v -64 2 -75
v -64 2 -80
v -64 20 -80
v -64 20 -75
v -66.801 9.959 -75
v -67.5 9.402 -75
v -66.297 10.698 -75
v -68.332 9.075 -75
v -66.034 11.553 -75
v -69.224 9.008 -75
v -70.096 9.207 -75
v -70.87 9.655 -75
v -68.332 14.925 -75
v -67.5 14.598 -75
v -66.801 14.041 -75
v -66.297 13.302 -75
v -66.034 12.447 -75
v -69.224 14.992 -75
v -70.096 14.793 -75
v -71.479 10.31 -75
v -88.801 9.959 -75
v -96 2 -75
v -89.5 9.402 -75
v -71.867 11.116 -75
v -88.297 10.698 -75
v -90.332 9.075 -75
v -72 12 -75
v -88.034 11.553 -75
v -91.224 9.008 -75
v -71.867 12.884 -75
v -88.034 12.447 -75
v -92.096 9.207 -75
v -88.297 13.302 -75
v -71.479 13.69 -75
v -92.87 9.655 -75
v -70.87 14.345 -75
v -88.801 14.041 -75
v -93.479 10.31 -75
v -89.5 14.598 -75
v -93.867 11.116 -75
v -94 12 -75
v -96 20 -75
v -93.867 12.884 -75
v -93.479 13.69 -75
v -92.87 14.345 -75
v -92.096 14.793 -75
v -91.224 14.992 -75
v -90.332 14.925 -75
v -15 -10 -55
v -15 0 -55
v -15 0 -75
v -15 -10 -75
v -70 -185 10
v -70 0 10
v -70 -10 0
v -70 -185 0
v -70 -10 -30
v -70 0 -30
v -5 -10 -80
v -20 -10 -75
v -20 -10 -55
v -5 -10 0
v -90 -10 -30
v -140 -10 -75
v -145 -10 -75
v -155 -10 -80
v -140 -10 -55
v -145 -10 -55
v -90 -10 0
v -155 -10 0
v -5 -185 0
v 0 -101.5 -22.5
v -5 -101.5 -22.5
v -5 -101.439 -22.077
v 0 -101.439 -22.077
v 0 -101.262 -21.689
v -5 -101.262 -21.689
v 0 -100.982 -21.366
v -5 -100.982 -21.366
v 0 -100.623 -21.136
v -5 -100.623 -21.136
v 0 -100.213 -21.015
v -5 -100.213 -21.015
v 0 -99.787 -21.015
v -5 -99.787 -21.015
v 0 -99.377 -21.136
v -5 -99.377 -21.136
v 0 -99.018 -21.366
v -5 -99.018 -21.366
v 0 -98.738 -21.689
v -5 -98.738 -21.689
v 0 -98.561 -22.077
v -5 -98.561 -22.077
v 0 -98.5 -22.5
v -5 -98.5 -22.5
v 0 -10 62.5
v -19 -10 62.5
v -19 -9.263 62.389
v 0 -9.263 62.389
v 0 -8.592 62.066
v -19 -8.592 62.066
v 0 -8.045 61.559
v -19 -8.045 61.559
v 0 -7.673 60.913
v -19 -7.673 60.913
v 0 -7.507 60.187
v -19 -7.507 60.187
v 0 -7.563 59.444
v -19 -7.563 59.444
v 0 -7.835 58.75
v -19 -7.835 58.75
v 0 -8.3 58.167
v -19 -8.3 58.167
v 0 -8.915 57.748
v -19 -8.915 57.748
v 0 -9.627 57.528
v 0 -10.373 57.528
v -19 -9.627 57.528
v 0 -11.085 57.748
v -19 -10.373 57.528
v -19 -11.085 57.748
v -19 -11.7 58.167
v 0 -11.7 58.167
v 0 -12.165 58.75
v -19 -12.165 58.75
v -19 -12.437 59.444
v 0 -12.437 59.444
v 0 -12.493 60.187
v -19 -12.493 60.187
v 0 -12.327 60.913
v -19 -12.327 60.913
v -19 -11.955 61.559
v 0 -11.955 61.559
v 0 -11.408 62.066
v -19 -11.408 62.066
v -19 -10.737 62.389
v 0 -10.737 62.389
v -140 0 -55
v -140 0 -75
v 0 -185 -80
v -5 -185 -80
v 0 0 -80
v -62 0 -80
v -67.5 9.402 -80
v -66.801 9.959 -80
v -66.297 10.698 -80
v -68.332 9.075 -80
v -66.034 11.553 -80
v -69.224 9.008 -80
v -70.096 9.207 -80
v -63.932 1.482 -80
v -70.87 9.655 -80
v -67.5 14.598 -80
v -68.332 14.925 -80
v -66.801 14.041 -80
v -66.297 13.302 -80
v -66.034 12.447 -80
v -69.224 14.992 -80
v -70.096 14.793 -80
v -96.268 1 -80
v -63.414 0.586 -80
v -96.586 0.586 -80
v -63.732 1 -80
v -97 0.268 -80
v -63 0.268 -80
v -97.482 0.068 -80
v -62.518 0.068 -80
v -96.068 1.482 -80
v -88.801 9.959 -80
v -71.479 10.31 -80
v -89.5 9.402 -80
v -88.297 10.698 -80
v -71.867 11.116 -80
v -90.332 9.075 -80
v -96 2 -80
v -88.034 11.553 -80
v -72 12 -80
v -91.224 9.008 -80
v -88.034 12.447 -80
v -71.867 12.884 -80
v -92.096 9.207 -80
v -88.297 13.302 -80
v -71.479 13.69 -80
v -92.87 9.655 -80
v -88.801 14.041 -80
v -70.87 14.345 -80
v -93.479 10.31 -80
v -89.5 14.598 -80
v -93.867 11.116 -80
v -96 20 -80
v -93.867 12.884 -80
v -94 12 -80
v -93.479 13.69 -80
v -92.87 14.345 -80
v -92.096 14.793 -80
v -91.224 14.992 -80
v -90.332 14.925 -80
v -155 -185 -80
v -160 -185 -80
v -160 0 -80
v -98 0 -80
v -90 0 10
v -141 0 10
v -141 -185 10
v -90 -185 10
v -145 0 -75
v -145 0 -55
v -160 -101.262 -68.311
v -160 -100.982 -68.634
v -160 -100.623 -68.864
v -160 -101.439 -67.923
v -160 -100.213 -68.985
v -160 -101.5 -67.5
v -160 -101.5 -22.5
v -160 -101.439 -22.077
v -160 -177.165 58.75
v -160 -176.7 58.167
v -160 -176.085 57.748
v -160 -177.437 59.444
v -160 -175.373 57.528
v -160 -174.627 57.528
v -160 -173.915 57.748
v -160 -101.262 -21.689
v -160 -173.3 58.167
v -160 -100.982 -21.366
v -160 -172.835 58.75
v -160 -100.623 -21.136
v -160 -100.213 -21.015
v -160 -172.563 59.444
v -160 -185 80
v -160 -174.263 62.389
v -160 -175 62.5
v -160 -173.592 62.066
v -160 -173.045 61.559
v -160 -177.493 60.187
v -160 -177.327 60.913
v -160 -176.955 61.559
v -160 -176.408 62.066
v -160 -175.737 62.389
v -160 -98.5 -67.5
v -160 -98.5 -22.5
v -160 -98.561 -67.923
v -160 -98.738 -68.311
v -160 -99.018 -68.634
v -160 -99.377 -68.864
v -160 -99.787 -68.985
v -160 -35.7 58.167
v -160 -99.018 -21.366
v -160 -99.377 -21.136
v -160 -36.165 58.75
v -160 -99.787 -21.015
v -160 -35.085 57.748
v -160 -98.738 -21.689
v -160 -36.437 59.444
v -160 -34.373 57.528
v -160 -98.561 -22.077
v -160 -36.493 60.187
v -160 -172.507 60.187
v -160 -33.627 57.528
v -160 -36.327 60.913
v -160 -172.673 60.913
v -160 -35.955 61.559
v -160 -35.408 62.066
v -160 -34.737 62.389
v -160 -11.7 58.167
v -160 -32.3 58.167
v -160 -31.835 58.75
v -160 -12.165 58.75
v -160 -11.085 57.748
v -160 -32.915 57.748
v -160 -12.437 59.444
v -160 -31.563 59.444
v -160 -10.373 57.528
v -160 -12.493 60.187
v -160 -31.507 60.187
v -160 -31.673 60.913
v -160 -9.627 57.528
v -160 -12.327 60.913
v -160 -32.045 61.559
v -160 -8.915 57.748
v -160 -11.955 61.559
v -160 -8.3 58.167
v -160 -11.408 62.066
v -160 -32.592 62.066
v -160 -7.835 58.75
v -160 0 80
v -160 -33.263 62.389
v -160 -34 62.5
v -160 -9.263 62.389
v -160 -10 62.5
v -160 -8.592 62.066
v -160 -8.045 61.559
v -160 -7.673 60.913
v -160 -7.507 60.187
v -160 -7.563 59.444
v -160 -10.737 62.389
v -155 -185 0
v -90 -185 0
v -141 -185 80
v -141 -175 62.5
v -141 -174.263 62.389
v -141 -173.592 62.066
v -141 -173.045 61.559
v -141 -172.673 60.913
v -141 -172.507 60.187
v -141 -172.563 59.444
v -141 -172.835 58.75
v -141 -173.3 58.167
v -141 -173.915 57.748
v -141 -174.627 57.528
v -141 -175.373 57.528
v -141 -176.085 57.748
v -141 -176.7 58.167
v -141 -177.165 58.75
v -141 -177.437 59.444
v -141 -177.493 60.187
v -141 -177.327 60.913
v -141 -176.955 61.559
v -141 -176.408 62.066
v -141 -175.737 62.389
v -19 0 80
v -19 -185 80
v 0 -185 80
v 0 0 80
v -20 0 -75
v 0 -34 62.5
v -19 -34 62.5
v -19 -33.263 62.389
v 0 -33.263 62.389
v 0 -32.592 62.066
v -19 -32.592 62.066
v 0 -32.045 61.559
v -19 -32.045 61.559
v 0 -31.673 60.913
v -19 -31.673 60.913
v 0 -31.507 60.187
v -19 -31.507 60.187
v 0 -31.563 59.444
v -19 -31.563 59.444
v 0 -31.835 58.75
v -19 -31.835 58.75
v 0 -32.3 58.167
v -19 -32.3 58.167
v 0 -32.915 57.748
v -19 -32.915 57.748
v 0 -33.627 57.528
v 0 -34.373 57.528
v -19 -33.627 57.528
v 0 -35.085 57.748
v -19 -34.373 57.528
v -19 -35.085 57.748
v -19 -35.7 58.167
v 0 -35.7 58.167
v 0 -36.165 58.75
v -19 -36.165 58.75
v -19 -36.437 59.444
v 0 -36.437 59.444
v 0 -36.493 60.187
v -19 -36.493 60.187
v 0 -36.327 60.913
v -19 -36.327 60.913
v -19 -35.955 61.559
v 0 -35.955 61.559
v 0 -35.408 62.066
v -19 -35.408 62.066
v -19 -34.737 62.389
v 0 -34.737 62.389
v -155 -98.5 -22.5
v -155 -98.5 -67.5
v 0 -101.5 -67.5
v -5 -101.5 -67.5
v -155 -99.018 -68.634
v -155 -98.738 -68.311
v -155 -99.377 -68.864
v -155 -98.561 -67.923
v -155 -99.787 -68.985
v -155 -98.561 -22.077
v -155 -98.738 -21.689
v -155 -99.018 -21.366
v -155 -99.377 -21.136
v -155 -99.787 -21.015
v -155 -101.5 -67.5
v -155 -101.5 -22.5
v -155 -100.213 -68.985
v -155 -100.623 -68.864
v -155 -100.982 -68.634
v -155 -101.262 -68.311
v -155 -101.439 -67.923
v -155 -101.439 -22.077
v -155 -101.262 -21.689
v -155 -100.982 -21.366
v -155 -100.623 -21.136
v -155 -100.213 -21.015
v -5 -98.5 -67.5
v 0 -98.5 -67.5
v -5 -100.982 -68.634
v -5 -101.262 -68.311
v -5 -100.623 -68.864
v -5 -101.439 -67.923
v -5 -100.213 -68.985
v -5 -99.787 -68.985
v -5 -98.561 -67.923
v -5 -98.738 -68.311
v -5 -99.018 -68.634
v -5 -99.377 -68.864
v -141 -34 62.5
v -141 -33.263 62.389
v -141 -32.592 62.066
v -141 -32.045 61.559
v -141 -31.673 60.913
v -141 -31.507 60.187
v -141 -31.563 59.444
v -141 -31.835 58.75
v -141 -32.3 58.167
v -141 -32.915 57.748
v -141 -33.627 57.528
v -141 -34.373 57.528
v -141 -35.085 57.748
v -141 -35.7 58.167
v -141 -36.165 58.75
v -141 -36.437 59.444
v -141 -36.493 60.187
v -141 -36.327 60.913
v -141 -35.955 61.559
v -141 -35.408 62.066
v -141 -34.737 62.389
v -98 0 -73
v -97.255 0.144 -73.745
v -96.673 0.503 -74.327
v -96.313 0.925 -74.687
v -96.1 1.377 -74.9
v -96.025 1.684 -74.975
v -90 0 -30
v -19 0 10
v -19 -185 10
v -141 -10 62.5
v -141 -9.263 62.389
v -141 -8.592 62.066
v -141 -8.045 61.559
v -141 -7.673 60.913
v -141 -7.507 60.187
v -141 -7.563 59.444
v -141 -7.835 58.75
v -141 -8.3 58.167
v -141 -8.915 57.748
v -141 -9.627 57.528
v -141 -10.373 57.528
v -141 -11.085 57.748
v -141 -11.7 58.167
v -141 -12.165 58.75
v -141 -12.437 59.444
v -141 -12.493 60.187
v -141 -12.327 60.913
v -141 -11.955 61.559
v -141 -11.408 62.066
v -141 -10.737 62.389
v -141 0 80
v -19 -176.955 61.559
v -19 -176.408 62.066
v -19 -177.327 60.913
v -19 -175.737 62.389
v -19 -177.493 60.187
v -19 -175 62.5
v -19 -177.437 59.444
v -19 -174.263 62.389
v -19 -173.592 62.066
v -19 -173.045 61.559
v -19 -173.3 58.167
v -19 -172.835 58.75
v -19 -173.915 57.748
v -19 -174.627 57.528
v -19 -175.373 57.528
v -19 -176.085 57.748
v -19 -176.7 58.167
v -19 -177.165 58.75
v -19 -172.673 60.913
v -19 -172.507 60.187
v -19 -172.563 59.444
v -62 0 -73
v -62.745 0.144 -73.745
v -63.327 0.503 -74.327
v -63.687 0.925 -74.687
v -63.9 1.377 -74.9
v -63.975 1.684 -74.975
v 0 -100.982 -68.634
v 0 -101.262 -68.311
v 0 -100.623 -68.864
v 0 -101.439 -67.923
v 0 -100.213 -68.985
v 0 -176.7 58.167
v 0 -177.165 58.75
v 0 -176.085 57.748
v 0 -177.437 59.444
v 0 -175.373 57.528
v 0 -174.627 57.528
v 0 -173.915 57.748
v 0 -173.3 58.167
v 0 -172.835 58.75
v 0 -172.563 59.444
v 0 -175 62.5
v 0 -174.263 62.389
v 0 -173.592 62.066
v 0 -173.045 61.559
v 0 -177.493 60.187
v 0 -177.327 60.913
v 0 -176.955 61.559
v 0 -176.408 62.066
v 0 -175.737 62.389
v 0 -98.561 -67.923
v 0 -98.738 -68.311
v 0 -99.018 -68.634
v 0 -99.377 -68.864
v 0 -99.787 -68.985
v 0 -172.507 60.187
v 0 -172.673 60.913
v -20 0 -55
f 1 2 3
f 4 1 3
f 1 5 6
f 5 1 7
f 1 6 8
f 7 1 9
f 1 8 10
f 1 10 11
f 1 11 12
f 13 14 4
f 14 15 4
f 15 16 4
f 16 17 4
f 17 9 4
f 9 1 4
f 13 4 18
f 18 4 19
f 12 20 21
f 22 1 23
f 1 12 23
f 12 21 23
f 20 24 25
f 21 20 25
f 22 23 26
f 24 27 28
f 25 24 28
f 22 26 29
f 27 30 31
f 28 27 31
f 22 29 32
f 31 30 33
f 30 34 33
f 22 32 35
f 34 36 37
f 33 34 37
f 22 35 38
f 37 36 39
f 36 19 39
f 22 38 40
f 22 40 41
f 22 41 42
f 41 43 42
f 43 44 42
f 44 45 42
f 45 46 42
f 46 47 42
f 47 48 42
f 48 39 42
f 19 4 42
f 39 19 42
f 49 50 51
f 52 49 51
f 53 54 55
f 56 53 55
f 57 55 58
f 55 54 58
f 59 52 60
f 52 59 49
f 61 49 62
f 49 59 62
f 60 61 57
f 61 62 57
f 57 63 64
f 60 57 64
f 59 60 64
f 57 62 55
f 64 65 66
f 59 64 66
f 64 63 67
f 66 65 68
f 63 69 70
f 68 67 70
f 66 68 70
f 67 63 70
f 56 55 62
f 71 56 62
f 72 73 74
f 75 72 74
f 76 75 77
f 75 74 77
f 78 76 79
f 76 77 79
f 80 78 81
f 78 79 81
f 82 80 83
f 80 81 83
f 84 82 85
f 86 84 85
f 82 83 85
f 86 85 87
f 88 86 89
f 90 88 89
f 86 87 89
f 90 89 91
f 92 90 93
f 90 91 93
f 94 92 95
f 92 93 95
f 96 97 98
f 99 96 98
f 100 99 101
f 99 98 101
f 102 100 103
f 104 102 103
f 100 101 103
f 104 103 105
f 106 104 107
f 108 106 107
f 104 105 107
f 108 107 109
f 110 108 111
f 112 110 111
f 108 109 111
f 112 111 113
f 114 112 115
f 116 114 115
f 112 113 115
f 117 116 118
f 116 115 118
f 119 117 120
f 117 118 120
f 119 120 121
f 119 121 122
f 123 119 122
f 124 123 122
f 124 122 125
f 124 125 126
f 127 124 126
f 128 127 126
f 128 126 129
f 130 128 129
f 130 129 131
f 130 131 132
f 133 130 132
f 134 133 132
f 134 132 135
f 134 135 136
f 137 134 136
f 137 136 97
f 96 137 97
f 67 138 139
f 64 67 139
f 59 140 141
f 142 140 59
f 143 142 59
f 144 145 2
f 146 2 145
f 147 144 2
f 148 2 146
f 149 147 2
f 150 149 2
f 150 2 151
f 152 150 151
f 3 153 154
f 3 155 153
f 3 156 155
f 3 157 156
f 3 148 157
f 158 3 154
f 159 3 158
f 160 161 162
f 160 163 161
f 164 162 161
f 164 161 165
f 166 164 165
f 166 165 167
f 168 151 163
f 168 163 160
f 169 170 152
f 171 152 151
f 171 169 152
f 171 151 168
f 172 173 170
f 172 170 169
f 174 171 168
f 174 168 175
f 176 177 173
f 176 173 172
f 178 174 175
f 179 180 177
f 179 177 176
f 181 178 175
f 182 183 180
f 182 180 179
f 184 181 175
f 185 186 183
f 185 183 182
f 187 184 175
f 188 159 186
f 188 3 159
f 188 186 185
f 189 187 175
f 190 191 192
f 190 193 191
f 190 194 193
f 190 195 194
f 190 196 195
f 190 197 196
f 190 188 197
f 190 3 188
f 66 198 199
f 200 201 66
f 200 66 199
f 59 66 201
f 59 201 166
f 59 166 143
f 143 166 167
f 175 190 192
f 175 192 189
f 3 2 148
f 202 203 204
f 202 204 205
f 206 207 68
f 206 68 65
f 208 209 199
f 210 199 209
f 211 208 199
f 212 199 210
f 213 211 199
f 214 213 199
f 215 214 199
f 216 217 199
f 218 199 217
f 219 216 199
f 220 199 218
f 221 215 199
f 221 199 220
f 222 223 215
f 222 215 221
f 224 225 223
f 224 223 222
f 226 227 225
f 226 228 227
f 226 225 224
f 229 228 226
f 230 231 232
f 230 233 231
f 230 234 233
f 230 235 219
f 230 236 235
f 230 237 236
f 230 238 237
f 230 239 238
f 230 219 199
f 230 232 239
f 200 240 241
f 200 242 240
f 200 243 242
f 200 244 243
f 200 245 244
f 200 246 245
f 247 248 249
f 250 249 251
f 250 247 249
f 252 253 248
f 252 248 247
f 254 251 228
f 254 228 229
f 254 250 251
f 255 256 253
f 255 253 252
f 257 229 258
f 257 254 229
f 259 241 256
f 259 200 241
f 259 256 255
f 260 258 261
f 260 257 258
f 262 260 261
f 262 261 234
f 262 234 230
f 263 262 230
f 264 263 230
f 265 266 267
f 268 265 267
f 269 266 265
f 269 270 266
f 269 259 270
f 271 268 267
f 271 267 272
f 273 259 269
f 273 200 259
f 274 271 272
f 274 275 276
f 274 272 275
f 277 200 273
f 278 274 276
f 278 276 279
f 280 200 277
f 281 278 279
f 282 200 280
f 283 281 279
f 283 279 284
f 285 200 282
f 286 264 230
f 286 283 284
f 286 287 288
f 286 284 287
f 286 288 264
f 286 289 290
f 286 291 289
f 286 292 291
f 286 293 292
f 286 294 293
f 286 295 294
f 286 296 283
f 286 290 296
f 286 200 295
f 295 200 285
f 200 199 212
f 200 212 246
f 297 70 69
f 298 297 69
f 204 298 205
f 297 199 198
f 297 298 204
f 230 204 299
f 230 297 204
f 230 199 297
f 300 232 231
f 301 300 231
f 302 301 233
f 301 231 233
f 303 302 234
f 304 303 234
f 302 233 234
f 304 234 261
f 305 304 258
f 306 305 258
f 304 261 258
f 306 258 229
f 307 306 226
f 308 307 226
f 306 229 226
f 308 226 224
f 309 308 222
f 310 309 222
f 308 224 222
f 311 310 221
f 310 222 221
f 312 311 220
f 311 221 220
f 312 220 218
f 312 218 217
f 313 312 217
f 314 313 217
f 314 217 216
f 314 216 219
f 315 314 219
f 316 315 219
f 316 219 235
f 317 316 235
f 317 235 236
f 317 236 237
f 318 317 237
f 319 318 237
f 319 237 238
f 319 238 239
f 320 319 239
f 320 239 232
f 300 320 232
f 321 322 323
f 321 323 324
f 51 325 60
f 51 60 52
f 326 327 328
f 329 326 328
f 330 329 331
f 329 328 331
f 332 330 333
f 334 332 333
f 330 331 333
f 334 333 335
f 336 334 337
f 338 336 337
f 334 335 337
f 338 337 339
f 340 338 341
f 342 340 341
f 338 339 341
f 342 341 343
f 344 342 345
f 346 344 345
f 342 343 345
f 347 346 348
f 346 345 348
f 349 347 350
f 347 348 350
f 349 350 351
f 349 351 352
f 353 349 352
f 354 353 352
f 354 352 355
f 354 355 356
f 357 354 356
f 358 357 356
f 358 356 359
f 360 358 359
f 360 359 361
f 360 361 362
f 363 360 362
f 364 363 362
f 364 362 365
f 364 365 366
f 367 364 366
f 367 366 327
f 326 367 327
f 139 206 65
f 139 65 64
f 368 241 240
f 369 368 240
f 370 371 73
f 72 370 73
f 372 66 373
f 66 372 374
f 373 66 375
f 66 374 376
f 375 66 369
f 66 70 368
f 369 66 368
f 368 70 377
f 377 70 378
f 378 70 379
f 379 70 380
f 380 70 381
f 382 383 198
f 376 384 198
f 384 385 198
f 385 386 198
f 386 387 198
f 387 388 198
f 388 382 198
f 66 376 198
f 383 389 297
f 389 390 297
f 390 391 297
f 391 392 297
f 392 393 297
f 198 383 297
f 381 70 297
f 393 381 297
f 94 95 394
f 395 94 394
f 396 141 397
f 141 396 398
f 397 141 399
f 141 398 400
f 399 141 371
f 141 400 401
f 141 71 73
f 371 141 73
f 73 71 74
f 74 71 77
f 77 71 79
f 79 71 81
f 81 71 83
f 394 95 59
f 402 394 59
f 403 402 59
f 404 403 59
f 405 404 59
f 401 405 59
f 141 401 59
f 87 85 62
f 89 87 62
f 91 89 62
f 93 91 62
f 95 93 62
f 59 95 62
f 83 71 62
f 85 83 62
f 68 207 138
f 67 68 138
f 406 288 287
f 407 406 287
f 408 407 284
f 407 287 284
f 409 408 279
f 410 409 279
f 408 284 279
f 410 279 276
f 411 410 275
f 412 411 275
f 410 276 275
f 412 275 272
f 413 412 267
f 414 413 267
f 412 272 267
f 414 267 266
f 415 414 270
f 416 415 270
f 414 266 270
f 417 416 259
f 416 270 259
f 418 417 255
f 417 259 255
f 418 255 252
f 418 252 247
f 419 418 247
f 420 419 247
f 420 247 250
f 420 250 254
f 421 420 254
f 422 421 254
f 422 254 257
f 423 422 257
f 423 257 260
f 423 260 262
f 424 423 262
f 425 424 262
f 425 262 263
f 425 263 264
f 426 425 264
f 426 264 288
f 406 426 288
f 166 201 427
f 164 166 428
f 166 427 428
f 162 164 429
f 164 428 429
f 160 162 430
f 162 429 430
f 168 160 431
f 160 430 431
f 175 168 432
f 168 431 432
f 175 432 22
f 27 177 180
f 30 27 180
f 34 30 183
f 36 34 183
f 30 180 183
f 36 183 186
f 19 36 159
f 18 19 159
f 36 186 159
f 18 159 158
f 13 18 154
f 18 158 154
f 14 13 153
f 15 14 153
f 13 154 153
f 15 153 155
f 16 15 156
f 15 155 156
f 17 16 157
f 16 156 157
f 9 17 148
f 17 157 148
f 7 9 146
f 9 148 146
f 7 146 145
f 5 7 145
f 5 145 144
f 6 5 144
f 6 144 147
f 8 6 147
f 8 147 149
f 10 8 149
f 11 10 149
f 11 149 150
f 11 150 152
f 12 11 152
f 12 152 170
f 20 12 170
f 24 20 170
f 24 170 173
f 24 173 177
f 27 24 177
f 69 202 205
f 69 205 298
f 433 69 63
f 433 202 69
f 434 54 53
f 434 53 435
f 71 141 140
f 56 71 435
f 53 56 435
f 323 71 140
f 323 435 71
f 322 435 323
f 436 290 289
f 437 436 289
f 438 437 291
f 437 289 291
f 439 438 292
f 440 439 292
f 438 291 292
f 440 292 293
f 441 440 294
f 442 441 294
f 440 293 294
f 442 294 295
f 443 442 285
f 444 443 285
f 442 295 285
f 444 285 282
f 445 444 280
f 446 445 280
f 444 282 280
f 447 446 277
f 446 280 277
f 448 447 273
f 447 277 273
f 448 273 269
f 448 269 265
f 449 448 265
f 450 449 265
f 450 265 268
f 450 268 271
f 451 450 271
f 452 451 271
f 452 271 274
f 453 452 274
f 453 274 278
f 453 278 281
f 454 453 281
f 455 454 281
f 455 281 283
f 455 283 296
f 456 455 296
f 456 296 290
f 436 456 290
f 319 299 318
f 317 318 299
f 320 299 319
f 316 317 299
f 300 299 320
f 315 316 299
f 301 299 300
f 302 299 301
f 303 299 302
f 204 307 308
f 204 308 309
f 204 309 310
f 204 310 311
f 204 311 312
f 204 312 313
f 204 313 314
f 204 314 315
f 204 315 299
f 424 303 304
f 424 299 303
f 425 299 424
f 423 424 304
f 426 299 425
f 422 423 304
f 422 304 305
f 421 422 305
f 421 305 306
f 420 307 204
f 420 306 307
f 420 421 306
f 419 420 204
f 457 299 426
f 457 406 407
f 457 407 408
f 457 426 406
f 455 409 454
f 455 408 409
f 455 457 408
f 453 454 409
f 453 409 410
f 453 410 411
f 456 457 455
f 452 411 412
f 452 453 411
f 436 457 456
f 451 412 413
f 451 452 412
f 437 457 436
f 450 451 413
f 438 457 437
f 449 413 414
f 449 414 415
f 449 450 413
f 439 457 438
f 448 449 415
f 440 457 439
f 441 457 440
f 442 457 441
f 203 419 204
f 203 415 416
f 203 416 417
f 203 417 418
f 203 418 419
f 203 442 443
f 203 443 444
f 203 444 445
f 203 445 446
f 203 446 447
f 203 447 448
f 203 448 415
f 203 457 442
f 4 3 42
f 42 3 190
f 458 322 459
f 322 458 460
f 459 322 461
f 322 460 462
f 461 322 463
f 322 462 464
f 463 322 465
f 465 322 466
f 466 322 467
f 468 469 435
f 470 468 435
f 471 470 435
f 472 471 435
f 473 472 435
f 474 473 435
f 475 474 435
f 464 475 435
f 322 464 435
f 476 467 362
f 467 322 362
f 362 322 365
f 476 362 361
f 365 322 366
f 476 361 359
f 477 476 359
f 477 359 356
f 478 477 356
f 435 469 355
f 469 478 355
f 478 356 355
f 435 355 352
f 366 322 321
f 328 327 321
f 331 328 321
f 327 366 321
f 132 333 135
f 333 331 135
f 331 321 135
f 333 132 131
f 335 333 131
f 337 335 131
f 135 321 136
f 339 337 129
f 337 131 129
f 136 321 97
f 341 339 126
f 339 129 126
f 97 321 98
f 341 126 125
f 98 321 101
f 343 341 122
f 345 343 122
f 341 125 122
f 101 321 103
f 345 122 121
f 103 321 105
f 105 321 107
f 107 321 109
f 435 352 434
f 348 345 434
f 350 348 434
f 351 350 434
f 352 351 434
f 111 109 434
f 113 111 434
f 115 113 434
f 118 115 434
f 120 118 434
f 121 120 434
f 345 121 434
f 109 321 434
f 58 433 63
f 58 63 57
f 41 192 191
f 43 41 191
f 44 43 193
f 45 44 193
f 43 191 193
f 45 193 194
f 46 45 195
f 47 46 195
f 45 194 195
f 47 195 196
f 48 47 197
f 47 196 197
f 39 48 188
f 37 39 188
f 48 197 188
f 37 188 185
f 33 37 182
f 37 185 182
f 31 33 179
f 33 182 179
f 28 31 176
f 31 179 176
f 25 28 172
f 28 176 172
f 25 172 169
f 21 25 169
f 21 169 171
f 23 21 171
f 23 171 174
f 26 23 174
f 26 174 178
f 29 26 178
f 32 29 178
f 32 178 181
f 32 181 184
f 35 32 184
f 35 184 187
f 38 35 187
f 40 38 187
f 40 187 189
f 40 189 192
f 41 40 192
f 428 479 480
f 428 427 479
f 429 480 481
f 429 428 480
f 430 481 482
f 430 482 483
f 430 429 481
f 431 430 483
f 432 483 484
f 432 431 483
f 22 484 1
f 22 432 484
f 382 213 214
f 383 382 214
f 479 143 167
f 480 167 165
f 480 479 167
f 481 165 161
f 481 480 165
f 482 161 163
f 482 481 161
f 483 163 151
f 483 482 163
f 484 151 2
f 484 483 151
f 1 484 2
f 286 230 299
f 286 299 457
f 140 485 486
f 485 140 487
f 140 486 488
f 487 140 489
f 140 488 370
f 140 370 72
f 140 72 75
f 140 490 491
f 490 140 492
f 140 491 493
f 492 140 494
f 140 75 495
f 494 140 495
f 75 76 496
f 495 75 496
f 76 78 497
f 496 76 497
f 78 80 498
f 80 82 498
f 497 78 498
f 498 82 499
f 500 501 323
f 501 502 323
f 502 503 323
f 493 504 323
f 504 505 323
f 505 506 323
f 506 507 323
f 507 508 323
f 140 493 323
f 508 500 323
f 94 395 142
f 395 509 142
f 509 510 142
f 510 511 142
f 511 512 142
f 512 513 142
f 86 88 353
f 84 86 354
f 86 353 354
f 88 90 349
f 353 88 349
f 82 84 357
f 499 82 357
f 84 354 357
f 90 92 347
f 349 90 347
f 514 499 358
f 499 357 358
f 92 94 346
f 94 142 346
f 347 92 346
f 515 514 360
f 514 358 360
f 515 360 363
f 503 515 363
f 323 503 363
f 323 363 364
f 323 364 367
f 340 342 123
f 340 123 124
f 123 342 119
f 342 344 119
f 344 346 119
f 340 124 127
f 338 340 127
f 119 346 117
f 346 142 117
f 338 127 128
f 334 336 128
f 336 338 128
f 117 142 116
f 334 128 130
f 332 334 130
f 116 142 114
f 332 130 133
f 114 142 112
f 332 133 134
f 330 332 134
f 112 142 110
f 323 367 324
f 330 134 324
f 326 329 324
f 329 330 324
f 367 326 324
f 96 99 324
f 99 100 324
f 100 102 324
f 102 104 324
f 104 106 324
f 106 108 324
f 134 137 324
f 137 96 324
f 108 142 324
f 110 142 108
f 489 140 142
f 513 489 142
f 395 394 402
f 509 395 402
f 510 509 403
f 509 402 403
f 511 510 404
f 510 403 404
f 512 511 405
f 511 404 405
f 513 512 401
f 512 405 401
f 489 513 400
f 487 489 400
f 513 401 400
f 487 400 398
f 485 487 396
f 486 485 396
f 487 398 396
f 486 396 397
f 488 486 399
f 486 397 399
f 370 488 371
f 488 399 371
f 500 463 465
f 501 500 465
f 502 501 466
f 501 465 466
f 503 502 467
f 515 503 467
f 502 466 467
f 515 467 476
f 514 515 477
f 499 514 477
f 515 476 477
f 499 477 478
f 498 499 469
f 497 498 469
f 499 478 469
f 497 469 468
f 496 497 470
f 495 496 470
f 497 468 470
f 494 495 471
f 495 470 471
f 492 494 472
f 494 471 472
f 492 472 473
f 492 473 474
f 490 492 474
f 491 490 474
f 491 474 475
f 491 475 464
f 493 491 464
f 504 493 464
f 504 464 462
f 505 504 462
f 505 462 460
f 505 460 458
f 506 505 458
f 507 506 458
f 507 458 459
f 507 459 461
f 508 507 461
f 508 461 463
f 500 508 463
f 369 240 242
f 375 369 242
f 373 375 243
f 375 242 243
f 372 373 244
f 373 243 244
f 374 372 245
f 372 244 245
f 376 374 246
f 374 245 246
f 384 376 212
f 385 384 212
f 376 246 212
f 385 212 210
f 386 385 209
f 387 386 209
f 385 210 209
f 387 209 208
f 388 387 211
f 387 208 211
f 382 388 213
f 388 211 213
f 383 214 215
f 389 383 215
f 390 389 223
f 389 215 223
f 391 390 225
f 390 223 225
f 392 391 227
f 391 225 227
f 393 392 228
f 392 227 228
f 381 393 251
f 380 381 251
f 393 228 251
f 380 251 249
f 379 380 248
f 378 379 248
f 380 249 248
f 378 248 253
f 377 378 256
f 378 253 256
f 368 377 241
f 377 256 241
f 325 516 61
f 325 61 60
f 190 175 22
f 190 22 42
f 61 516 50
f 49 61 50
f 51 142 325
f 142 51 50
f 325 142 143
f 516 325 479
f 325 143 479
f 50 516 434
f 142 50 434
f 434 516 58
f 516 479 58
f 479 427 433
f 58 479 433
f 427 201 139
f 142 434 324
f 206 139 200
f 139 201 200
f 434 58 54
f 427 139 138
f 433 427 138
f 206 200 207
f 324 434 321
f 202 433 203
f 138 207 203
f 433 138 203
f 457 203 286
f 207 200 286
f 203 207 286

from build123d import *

# Parameters (mm, degrees)
SKETCH_1_W               = 160
SKETCH_1_H               = 185
EXTRUDE_1_DEPTH          = 10
EXTRUDE_2_DEPTH          = 80
SKETCH_14_W              = 20
SKETCH_14_H              = 50
CUT_EXTRUDE_4_DEPTH      = 258.342184649
SKETCH_16_W              = 32
SKETCH_16_H              = 20
EXTRUDE_7_DEPTH          = 5
CUT_EXTRUDE_7_REACH      = 262.624
SKETCH_18_R              = 3
FILLET_1_R               = 2
SKETCH_21_W              = 70
SKETCH_21_H              = 185
SKETCH_21_R              = 2.5
EXTRUDE_8_DEPTH          = 160
CUT_EXTRUDE_9_DEPTH      = 255.263642702
CUT_EXTRUDE_9_DEPTH_BACK = 255.263642702
SKETCH_23_W              = 122
SKETCH_23_H              = 70
CUT_EXTRUDE_10_DEPTH     = 258.342184649
CUT_EXTRUDE_11_REACH     = 259.342
SKETCH_24_W              = 5
SKETCH_24_H              = 20


with BuildPart() as part:
    # 草圖1 → 填料-伸長1 (new body)
    with BuildSketch(Plane.XY):
        with Locations((-80, -92.5)):
            Rectangle(SKETCH_1_W, SKETCH_1_H)
    extrude(amount=EXTRUDE_1_DEPTH)

    # 草圖2 → 填料-伸長2 (add)
    with BuildSketch(Plane(origin=(0, 0, 0), x_dir=(-1, 0, 0), z_dir=(0, 0, -1))):
        Polygon((0, 0), (0, -185), (5, -185), (5, -10), (155, -10), (155, -185), (160, -185), (160, 0), align=None)
    extrude(amount=EXTRUDE_2_DEPTH)

    # 草圖14 → 除料-伸長4 (cut, through all)
    with BuildSketch(Plane(origin=(0, 0, 0), x_dir=(1, 0, 0), z_dir=(0, 1, 0))):
        with Locations((-80, 5)):
            Rectangle(SKETCH_14_W, SKETCH_14_H)
    extrude(amount=-CUT_EXTRUDE_4_DEPTH, mode=Mode.SUBTRACT)

    # 草圖16 → 填料-伸長7 (add)
    with BuildSketch(Plane(origin=(0, 0, -80), x_dir=(-1, 0, 0), z_dir=(0, 0, -1))):
        with Locations((80, 10)):
            Rectangle(SKETCH_16_W, SKETCH_16_H)
    extrude(amount=-EXTRUDE_7_DEPTH)

    # 草圖18 → 除料-伸長7 (cut, up to next)
    with BuildSketch(Plane(origin=(0, 0, -80), x_dir=(-1, 0, 0), z_dir=(0, 0, -1)), mode=Mode.PRIVATE) as cut_extrude_7_sk1:
        with Locations((69, 12)):
            Circle(SKETCH_18_R)
    cut_extrude_7_tool1 = extrude(cut_extrude_7_sk1.sketch, amount=-CUT_EXTRUDE_7_REACH, mode=Mode.PRIVATE) & part.part
    # 草圖18 → 除料-伸長7 (cut, up to next)
    with BuildSketch(Plane(origin=(0, 0, -80), x_dir=(-1, 0, 0), z_dir=(0, 0, -1)), mode=Mode.PRIVATE) as cut_extrude_7_sk2:
        with Locations((91, 12)):
            Circle(SKETCH_18_R)
    cut_extrude_7_tool2 = extrude(cut_extrude_7_sk2.sketch, amount=-CUT_EXTRUDE_7_REACH, mode=Mode.PRIVATE) & part.part
    add(cut_extrude_7_tool1.solids().sort_by_distance((-69, 12, -80))[0], mode=Mode.SUBTRACT)
    add(cut_extrude_7_tool2.solids().sort_by_distance((-91, 12, -80))[0], mode=Mode.SUBTRACT)

    # 圓角1
    fillet_1_edges = [part.edges().sort_by_distance(p)[0] for p in [
        (-80, 0, -75),
        (-96, 0, -77.5),
        (-64, 0, -77.5),
    ]]
    fillet(fillet_1_edges, radius=FILLET_1_R)

    # 草圖21 → 填料-伸長8 (add)
    with BuildSketch(Plane.ZY.offset(160)):
        with Locations((45, -92.5)):
            Rectangle(SKETCH_21_W, SKETCH_21_H)
        with Locations((60, -10)):
            Circle(SKETCH_21_R, mode=Mode.SUBTRACT)
        with Locations((60, -175)):
            Circle(SKETCH_21_R, mode=Mode.SUBTRACT)
        with Locations((60, -34)):
            Circle(SKETCH_21_R, mode=Mode.SUBTRACT)
    extrude(amount=-EXTRUDE_8_DEPTH)

    # 草圖22 → 除料-伸長9 (cut, two sides: drawn at the far end of the back side and taken through both)
    with BuildSketch(Plane(origin=(-155, 0, 0), x_dir=(0, 0, -1), z_dir=(1, 0, 0)).offset(-CUT_EXTRUDE_9_DEPTH_BACK)):
        with BuildLine():
            Line((22.5, -98.5), (67.5, -98.5))
            ThreePointArc((67.5, -98.5), (69, -100), (67.5, -101.5))
            Line((67.5, -101.5), (22.5, -101.5))
            ThreePointArc((22.5, -101.5), (21, -100), (22.5, -98.5))
        make_face()
    extrude(amount=CUT_EXTRUDE_9_DEPTH + CUT_EXTRUDE_9_DEPTH_BACK, mode=Mode.SUBTRACT)

    # 草圖23 → 除料-伸長10 (cut, through all)
    with BuildSketch(Plane(origin=(0, 0, 0), x_dir=(1, 0, 0), z_dir=(0, 1, 0))):
        with Locations((-80, -45)):
            Rectangle(SKETCH_23_W, SKETCH_23_H)
    extrude(amount=-CUT_EXTRUDE_10_DEPTH, mode=Mode.SUBTRACT)

    # 草圖24 → 除料-伸長11 (cut, up to next)
    with BuildSketch(Plane(origin=(0, 0, 0), x_dir=(1, 0, 0), z_dir=(0, 1, 0)), mode=Mode.PRIVATE) as cut_extrude_11_sk1:
        with Locations((-142.5, 65)):
            Rectangle(SKETCH_24_W, SKETCH_24_H)
    cut_extrude_11_tool1 = extrude(cut_extrude_11_sk1.sketch, amount=-CUT_EXTRUDE_11_REACH, mode=Mode.PRIVATE) & part.part
    # 草圖24 → 除料-伸長11 (cut, up to next)
    with BuildSketch(Plane(origin=(0, 0, 0), x_dir=(1, 0, 0), z_dir=(0, 1, 0)), mode=Mode.PRIVATE) as cut_extrude_11_sk2:
        with Locations((-17.5, 65)):
            Rectangle(SKETCH_24_W, SKETCH_24_H)
    cut_extrude_11_tool2 = extrude(cut_extrude_11_sk2.sketch, amount=-CUT_EXTRUDE_11_REACH, mode=Mode.PRIVATE) & part.part
    add(cut_extrude_11_tool1.solids().sort_by_distance((-142.5, 0, -65))[0], mode=Mode.SUBTRACT)
    add(cut_extrude_11_tool2.solids().sort_by_distance((-17.5, 0, -65))[0], mode=Mode.SUBTRACT)


solid = part.part
